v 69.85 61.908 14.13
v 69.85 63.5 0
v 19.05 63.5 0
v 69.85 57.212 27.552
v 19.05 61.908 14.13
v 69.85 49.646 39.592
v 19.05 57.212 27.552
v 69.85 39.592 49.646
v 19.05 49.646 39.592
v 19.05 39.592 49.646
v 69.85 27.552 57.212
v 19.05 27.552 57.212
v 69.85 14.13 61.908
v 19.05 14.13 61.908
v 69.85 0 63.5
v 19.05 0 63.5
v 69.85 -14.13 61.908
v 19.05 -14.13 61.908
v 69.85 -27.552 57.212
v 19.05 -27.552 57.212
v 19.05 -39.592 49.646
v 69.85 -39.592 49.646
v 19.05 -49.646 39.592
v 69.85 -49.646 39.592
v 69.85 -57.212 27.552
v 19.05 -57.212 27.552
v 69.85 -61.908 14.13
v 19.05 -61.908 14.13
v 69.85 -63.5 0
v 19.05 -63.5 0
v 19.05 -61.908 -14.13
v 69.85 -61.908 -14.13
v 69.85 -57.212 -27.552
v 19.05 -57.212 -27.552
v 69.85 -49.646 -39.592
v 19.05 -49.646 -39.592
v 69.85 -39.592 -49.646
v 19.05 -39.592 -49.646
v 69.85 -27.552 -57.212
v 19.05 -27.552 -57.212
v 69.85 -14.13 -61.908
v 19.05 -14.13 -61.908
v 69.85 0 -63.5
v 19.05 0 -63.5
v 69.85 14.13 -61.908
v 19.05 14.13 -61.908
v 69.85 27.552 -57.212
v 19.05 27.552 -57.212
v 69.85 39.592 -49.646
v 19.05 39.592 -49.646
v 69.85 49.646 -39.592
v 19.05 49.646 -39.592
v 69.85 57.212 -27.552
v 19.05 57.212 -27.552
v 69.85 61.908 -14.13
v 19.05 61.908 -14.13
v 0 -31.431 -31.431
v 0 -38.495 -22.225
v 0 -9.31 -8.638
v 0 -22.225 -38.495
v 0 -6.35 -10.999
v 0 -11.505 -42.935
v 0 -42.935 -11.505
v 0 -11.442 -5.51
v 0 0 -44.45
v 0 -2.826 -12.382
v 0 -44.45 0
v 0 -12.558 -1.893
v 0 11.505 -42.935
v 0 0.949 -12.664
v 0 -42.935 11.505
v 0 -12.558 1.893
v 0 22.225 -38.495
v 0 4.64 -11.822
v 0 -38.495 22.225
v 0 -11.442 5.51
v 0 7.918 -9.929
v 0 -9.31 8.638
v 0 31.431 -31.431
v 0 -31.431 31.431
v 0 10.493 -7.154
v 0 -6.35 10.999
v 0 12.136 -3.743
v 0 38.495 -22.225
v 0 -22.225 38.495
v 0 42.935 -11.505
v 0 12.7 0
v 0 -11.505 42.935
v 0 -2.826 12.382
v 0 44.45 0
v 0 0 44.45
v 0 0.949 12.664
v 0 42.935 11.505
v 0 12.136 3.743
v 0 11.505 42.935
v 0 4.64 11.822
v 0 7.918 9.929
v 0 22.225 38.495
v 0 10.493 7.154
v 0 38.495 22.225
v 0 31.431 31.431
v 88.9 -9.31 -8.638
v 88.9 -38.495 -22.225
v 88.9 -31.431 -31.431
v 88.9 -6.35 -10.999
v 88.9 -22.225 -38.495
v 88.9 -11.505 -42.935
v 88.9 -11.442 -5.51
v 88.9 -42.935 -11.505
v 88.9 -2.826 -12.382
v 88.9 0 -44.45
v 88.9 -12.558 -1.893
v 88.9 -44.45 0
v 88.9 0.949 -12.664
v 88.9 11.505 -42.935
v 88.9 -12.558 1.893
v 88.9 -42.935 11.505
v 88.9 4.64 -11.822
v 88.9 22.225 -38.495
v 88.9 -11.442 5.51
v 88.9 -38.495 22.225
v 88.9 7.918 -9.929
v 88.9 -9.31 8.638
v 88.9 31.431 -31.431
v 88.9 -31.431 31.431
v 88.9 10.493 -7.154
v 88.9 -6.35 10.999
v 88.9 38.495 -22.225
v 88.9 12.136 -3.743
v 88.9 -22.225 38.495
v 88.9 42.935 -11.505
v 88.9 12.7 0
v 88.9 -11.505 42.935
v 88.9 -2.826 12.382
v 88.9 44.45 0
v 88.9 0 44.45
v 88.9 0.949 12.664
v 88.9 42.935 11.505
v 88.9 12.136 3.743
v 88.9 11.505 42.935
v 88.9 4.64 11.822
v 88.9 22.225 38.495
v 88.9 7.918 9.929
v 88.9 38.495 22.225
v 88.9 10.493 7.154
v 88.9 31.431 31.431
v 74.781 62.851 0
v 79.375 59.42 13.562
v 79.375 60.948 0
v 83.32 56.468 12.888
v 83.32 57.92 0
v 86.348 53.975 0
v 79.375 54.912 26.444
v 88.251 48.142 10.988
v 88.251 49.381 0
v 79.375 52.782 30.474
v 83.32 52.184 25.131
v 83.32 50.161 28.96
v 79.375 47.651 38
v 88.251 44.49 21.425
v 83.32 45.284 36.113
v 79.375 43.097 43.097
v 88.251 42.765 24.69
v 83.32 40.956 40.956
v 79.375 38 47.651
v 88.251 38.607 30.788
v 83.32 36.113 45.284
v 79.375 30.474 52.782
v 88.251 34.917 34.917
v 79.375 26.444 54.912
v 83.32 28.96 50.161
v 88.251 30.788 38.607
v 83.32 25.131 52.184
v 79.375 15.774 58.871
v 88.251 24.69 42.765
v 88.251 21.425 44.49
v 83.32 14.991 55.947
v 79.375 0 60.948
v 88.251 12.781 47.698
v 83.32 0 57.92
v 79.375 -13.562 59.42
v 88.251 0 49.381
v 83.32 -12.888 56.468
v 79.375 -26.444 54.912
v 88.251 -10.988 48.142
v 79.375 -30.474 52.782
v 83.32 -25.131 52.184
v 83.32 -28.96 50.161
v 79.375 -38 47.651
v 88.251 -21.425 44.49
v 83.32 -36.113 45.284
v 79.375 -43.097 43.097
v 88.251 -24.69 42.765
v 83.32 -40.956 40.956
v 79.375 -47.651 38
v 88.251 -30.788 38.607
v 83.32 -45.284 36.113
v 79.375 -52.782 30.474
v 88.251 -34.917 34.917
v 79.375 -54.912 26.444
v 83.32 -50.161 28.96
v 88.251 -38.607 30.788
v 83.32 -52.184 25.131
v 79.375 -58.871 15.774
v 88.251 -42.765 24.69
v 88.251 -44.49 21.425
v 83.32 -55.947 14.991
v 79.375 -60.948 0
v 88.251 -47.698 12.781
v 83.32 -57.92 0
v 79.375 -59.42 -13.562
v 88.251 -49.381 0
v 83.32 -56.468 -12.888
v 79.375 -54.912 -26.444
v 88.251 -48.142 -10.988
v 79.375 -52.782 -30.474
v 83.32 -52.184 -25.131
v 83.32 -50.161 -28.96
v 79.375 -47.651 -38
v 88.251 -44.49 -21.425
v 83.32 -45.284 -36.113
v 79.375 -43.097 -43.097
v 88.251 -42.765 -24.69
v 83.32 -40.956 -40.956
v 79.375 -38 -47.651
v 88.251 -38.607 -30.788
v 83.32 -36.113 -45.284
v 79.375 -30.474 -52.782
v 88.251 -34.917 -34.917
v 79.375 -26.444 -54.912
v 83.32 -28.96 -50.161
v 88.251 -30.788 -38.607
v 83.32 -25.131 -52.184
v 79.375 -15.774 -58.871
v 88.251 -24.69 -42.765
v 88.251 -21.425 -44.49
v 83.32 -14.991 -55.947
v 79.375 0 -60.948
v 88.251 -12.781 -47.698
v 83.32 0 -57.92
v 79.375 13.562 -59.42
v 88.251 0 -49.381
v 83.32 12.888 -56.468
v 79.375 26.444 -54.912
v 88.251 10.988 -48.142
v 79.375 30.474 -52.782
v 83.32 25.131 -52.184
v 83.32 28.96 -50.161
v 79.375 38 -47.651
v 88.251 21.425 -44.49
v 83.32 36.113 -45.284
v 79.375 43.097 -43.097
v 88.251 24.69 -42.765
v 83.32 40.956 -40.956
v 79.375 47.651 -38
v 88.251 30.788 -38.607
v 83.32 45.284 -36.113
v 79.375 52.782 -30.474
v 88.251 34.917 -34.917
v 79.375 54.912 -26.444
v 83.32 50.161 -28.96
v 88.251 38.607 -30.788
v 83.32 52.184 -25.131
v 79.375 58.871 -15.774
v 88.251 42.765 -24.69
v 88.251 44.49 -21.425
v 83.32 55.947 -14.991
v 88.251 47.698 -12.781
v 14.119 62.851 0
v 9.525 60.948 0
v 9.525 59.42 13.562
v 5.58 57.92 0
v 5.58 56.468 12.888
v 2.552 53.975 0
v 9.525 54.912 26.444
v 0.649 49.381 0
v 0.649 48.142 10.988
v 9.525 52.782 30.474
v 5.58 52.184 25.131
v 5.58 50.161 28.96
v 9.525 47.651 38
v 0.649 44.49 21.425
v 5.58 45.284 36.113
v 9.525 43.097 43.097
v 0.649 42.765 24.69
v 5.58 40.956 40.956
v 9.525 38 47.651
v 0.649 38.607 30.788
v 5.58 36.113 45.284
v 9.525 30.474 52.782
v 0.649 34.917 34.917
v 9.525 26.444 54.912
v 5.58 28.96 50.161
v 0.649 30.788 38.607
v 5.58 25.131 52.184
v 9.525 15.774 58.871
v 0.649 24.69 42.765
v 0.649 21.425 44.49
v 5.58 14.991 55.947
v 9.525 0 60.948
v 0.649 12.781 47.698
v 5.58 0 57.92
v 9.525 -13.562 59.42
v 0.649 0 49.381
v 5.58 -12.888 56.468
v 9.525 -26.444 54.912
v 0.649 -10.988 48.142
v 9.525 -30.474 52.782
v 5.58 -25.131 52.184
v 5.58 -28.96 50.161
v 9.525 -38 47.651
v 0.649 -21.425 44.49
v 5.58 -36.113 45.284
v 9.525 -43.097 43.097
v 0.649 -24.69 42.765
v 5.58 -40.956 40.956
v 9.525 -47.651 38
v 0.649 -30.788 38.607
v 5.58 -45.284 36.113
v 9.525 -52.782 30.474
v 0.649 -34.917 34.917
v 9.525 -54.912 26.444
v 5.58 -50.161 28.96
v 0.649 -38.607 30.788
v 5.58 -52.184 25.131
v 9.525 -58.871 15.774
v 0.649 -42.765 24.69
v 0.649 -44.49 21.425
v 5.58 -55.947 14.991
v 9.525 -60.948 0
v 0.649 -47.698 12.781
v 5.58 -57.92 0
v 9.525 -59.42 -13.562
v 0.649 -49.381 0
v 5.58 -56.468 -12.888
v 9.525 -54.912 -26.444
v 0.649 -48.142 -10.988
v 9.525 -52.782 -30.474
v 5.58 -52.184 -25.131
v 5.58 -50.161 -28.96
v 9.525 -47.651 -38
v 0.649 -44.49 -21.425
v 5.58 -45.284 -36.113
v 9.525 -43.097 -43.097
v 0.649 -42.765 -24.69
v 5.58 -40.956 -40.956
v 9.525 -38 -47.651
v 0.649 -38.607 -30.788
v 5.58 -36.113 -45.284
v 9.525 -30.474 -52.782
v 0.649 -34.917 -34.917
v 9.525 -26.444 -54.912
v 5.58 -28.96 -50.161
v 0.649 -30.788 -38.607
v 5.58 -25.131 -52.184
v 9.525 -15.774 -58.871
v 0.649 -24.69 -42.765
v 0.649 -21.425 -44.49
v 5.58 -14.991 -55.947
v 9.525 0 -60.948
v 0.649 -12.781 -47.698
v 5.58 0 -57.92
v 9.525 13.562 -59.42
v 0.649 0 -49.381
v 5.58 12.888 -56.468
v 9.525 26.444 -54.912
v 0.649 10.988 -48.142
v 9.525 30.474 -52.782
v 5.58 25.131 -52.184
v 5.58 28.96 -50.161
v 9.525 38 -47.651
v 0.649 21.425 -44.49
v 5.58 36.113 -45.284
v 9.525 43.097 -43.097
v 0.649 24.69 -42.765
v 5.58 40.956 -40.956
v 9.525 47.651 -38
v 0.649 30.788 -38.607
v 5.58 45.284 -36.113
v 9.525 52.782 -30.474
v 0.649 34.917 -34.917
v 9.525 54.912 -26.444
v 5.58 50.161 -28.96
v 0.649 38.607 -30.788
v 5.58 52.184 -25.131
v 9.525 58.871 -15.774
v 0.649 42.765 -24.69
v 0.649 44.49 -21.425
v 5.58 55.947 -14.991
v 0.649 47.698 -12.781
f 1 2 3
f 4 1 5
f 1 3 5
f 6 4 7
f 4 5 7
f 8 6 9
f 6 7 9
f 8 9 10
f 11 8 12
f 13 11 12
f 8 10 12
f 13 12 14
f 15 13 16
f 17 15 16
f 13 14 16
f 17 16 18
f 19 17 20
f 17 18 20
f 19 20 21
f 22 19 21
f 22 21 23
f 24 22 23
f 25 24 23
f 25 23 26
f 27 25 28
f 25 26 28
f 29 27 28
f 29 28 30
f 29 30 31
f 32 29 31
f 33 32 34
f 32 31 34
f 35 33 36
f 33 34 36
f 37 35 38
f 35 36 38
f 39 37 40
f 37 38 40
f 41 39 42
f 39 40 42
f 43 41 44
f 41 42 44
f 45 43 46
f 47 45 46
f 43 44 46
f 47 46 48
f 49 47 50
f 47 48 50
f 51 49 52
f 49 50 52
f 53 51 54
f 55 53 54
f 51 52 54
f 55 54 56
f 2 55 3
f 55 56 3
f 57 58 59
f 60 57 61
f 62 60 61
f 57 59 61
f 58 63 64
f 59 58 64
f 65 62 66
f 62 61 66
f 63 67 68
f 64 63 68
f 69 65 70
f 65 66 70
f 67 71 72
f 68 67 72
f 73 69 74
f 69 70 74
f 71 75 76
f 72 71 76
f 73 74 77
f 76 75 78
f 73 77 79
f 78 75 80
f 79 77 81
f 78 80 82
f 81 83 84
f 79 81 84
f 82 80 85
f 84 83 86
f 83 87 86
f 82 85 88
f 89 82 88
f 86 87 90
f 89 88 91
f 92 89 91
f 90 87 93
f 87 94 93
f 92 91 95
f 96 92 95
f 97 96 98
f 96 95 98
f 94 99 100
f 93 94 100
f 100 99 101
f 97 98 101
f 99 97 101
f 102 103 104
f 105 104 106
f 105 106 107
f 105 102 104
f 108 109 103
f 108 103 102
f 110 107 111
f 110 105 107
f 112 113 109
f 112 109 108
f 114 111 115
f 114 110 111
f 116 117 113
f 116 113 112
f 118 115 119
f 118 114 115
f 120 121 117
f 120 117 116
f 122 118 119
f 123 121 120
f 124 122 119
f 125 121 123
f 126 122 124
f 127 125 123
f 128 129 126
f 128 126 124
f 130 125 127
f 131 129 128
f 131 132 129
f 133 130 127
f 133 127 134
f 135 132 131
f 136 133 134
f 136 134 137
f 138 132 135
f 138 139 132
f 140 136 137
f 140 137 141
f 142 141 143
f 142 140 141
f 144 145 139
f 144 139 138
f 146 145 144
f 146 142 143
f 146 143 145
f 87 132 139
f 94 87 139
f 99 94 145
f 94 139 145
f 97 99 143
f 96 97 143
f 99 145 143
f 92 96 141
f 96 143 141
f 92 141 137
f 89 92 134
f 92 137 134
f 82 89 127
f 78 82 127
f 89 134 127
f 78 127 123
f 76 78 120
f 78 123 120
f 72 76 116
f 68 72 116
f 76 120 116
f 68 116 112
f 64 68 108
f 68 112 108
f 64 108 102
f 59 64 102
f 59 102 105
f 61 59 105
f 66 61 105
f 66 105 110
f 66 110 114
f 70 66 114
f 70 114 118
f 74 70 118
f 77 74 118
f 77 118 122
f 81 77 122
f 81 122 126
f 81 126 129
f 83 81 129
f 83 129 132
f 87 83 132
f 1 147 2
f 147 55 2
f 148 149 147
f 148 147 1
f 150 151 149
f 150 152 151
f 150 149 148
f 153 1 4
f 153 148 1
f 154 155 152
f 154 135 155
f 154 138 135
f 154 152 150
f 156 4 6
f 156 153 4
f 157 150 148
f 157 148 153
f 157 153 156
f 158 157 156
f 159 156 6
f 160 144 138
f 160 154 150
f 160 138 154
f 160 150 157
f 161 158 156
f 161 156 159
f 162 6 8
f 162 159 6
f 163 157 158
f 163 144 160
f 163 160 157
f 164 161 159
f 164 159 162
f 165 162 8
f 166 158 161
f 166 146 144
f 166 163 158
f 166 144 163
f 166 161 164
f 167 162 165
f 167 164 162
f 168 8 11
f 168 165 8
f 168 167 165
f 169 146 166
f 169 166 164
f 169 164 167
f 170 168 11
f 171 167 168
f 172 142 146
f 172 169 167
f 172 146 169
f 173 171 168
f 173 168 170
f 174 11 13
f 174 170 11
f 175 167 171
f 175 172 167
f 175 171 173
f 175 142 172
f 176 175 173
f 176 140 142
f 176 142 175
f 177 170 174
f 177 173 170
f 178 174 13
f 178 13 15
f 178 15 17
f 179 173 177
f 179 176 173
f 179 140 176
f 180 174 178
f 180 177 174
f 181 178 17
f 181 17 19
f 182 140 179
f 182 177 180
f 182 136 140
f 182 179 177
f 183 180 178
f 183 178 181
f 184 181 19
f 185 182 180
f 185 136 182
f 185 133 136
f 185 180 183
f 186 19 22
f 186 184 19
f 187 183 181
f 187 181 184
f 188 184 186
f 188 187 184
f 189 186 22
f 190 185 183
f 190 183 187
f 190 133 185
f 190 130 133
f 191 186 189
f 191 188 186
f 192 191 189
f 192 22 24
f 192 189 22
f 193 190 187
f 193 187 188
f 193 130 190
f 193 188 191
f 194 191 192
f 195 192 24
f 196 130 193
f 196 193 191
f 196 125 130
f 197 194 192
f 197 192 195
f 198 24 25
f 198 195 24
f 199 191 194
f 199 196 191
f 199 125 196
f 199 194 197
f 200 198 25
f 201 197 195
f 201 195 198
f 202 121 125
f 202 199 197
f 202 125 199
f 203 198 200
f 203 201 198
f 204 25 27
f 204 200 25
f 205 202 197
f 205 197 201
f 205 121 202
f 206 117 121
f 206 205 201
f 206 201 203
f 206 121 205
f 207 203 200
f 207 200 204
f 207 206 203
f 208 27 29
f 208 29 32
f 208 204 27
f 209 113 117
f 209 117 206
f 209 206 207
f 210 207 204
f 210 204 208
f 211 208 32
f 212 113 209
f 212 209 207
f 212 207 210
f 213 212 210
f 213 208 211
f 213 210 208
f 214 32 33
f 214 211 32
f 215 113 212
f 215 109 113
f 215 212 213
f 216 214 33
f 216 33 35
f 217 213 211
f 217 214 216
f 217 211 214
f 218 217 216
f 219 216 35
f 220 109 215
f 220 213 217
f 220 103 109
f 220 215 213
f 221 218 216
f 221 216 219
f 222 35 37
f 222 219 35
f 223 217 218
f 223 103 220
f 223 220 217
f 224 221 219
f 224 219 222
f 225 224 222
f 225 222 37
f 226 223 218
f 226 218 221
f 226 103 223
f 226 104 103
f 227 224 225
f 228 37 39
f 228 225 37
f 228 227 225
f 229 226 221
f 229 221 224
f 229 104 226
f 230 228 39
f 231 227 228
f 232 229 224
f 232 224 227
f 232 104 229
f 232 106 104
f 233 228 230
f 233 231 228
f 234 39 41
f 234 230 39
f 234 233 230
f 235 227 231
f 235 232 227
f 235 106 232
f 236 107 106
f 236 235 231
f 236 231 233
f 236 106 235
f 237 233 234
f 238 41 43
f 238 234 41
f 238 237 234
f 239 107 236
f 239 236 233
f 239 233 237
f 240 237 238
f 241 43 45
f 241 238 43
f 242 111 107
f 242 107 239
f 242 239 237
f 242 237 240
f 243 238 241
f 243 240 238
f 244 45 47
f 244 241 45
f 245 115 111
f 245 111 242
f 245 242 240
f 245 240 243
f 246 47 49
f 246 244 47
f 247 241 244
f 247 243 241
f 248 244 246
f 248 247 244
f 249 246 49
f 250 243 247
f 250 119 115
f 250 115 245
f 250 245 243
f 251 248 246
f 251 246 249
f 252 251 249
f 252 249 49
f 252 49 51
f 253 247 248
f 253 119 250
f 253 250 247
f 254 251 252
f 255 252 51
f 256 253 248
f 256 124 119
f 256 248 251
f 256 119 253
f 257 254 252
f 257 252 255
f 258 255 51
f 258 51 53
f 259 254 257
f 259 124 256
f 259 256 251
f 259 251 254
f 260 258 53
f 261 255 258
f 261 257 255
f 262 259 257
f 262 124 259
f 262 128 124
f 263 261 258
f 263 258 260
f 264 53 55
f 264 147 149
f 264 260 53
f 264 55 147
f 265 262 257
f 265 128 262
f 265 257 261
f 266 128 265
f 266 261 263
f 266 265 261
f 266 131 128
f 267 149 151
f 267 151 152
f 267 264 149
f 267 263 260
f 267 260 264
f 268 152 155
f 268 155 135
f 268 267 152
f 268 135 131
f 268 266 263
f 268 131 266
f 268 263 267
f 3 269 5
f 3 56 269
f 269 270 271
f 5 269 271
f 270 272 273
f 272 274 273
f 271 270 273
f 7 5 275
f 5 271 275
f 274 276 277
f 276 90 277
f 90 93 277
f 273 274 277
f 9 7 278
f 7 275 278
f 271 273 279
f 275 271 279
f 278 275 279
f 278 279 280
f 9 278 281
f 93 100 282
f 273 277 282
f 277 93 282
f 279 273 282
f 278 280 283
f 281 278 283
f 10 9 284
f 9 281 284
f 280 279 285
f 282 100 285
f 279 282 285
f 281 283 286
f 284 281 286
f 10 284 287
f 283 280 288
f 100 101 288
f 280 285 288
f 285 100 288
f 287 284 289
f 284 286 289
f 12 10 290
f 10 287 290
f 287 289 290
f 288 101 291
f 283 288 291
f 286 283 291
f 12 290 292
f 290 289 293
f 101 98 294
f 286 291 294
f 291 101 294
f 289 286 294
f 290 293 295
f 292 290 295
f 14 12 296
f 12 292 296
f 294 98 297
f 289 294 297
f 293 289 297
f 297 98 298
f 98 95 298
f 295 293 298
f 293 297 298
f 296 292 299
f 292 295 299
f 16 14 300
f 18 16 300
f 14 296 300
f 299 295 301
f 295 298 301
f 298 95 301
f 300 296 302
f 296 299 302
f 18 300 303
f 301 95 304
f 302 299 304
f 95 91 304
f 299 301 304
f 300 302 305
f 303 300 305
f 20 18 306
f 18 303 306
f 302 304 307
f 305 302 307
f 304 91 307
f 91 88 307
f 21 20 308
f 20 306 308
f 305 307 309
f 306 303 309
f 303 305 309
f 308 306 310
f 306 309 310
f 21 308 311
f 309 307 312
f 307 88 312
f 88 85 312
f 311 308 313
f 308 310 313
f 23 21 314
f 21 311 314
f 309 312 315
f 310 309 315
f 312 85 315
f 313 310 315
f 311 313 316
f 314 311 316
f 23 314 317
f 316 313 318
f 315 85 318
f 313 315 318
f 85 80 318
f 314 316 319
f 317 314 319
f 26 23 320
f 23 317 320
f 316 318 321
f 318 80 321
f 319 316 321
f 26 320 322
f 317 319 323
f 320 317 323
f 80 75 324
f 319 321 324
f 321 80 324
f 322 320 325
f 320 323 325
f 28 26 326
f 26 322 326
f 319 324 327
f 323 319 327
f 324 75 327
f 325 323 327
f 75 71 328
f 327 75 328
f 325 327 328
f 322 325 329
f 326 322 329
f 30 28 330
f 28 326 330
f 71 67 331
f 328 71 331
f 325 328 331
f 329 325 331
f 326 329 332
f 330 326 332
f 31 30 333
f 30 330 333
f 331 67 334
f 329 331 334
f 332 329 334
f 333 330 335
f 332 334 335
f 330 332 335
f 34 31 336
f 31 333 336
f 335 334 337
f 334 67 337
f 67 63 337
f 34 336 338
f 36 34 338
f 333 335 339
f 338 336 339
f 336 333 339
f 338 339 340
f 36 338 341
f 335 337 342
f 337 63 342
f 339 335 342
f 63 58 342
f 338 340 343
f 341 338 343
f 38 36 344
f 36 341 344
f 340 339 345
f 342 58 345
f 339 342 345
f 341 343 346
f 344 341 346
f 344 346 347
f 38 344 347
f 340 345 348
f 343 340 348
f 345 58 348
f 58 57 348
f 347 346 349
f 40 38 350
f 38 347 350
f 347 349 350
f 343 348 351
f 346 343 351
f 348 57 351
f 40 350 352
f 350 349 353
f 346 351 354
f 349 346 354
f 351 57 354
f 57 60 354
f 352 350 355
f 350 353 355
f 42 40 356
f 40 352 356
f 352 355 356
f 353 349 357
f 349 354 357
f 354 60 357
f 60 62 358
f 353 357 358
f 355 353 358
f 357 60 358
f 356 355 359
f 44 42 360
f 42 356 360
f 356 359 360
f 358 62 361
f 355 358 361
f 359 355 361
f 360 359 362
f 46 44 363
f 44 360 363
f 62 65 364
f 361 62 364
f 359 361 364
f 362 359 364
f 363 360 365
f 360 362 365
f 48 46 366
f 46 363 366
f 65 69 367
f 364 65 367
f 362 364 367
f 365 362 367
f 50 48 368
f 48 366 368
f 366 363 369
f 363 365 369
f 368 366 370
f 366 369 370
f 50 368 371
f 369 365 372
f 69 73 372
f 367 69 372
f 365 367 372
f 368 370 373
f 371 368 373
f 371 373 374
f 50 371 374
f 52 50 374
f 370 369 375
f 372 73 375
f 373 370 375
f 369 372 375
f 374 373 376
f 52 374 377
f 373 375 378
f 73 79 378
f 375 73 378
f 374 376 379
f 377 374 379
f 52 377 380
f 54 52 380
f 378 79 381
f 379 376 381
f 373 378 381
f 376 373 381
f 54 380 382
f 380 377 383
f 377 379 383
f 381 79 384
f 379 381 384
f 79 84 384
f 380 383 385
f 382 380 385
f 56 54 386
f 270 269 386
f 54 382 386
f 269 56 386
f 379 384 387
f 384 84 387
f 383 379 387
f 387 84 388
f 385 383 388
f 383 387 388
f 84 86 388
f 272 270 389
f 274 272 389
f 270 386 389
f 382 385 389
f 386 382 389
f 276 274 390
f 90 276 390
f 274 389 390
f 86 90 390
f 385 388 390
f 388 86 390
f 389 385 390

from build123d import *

# Parameters (mm, degrees)
F0_R     = 63.5
F1_DEPTH = 88.9
F2_R     = 19.05
F3_R     = 12.7
F4_DEPTH = 88.901


with BuildPart() as f1:
    # F0 (on Right) → F1 (new body)
    with BuildSketch(Plane.YZ):
        Circle(F0_R)
    extrude(amount=F1_DEPTH)

    # F2
    f2_edges = [f1.edges().sort_by_distance(p)[0] for p in [
        (0, -63.5, 0),
        (44.45, 63.5, 0),
        (88.9, -63.5, 0),
    ]]
    fillet(f2_edges, radius=F2_R)

    # F3 (on face) → F4 (cut, through all)
    with BuildSketch(Plane.YZ.offset(88.9)):
        Circle(F3_R)
    extrude(amount=-F4_DEPTH, mode=Mode.SUBTRACT)


solid = f1.part
